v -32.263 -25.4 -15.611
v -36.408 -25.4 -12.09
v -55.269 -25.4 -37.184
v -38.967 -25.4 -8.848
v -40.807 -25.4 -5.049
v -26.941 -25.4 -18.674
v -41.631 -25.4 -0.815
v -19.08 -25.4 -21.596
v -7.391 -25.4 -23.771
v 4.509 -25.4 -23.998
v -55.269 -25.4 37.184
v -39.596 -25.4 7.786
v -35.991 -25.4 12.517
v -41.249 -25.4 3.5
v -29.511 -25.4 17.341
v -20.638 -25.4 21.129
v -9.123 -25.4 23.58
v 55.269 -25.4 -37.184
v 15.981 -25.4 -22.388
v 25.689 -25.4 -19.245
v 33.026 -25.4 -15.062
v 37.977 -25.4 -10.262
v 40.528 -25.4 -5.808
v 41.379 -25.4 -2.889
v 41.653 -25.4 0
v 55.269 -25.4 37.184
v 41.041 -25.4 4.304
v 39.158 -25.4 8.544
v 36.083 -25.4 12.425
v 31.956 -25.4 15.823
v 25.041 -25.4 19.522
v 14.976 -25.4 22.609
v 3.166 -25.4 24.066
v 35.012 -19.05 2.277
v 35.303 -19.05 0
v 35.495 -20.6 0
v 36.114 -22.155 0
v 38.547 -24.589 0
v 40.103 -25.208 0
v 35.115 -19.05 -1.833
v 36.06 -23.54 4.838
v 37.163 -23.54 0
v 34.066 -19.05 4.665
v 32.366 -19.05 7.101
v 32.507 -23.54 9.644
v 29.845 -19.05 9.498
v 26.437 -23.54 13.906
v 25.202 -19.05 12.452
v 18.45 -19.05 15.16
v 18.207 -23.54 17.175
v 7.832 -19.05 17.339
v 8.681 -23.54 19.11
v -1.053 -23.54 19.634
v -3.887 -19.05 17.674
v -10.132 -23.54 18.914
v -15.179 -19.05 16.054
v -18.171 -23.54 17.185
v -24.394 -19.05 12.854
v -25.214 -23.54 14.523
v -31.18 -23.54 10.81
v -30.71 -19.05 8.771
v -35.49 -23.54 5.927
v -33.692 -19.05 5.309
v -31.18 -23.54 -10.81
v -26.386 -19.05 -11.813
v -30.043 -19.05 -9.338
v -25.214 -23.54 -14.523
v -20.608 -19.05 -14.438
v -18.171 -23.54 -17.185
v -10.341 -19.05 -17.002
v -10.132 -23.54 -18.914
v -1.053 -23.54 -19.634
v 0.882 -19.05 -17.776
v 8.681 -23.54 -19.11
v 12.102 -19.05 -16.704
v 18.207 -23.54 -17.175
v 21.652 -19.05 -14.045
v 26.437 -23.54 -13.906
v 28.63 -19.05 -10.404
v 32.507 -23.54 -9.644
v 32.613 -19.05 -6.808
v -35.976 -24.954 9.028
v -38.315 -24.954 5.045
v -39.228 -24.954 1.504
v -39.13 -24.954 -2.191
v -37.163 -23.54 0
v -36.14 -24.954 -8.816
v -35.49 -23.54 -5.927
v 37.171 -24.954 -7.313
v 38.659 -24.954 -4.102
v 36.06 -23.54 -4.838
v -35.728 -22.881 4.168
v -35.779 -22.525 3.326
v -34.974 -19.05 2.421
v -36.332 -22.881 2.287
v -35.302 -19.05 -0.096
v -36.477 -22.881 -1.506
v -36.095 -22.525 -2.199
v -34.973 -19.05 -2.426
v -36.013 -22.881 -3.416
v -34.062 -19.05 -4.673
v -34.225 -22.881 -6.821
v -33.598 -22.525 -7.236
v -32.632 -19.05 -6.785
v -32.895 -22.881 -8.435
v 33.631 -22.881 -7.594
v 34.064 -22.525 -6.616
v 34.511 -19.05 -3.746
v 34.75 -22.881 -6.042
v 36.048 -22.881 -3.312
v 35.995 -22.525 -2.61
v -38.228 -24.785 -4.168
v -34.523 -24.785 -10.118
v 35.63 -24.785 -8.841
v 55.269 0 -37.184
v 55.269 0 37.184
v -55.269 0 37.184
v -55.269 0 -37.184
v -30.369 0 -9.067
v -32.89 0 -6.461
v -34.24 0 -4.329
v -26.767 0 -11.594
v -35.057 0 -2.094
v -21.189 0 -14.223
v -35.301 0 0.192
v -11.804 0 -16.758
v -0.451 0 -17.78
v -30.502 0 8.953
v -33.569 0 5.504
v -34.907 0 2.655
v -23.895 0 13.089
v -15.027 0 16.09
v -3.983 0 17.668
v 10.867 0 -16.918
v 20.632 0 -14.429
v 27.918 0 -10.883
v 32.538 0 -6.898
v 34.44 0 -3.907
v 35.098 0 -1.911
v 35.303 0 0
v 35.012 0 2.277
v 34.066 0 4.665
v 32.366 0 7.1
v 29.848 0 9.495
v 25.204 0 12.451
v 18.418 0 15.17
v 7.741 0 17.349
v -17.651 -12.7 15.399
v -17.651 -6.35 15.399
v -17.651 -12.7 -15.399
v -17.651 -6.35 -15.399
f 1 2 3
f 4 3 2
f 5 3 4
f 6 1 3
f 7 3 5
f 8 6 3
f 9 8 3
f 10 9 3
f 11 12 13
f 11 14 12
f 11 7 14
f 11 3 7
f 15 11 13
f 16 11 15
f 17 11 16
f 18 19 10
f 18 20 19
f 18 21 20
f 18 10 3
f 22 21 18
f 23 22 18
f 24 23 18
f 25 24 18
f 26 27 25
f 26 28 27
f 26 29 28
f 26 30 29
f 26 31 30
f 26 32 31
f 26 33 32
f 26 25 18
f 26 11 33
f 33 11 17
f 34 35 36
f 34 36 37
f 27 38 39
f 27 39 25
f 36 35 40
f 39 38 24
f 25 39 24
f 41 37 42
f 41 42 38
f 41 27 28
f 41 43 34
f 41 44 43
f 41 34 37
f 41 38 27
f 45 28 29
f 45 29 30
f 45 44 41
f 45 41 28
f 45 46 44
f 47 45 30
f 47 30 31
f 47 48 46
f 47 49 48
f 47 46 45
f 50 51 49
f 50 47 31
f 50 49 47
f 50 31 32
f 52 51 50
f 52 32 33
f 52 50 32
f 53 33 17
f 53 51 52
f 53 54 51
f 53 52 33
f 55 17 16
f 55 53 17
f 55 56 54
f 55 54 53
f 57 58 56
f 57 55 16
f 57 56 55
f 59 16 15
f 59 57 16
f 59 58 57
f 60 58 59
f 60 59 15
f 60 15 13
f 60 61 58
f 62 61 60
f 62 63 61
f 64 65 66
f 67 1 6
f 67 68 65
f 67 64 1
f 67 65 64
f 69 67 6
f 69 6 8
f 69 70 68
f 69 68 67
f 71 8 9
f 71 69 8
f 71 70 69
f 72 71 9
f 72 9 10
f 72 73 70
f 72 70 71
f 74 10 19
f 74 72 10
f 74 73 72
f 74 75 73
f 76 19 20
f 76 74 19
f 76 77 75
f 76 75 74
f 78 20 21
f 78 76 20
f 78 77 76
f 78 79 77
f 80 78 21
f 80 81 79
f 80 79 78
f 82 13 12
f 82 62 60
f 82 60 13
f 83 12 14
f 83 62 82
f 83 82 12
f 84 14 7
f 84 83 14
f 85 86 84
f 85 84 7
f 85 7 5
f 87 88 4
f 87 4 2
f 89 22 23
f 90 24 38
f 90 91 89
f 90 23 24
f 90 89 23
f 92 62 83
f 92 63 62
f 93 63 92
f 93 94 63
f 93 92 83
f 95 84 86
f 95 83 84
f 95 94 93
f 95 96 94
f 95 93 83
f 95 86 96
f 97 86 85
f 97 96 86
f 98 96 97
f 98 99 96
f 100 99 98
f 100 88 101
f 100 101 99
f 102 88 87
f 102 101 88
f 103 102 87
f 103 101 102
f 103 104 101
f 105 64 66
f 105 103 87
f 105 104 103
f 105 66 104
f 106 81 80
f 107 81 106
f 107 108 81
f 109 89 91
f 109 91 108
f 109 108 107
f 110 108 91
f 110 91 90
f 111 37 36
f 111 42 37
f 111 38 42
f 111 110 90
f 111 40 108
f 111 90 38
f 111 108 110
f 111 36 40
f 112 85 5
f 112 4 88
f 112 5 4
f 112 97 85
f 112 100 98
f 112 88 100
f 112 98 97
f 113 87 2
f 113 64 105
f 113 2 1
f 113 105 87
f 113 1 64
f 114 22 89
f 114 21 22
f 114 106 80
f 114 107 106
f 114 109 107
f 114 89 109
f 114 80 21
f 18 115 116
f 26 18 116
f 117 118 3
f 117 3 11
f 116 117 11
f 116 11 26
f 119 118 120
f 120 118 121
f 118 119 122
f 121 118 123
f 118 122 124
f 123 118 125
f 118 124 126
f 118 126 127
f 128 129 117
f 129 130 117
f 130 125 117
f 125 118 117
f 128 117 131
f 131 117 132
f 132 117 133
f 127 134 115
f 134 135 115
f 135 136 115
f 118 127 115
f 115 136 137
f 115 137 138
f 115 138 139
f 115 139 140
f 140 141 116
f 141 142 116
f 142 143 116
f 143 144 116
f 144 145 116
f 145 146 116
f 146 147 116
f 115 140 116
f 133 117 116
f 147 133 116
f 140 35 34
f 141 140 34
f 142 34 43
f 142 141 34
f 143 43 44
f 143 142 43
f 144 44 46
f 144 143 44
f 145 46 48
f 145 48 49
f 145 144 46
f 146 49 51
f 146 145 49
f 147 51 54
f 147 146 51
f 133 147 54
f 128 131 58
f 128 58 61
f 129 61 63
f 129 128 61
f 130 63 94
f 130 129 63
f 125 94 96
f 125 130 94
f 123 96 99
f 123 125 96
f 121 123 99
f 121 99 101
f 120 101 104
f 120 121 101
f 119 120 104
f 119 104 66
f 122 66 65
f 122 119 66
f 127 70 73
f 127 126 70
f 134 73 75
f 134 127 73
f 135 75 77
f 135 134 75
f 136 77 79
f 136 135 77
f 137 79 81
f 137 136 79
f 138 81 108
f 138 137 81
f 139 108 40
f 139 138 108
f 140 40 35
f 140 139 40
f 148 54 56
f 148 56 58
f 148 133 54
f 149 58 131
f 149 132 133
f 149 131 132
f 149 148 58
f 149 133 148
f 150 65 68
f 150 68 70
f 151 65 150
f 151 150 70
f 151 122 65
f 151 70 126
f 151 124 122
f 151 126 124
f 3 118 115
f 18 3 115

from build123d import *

# Parameters (mm, degrees)
F0_W     = 110.538222
F0_H     = 74.367344
F1_DEPTH = 25.4
F2_R     = 6.35


with BuildPart() as f1:
    # F0 (on Front) → F1 (new body)
    with BuildSketch(Plane.XZ):
        Rectangle(F0_W, F0_H)
        with BuildLine():
            add(Edge.make_bspline(
                [(35.302788, 0), (35.302788, 30.798925), (-17.651394, 15.399462), (-70.605576, 0), (-17.651394, -15.399462), (35.302788, -30.798925), (35.302788, 0)],
                knots=[0, 0, 0, 2.094395, 2.094395, 4.18879, 4.18879, 6.283185, 6.283185, 6.283185], degree=2, weights=[1, 0.5, 1, 0.5, 1, 0.5, 1]))
        make_face(mode=Mode.SUBTRACT)
    extrude(amount=F1_DEPTH)

    # F2
    f2_edges = [f1.edges().sort_by_distance(p)[0] for p in [
        (-35.302788, -25.4, 4e-06),
    ]]
    fillet(f2_edges, radius=F2_R)


solid = f1.part
